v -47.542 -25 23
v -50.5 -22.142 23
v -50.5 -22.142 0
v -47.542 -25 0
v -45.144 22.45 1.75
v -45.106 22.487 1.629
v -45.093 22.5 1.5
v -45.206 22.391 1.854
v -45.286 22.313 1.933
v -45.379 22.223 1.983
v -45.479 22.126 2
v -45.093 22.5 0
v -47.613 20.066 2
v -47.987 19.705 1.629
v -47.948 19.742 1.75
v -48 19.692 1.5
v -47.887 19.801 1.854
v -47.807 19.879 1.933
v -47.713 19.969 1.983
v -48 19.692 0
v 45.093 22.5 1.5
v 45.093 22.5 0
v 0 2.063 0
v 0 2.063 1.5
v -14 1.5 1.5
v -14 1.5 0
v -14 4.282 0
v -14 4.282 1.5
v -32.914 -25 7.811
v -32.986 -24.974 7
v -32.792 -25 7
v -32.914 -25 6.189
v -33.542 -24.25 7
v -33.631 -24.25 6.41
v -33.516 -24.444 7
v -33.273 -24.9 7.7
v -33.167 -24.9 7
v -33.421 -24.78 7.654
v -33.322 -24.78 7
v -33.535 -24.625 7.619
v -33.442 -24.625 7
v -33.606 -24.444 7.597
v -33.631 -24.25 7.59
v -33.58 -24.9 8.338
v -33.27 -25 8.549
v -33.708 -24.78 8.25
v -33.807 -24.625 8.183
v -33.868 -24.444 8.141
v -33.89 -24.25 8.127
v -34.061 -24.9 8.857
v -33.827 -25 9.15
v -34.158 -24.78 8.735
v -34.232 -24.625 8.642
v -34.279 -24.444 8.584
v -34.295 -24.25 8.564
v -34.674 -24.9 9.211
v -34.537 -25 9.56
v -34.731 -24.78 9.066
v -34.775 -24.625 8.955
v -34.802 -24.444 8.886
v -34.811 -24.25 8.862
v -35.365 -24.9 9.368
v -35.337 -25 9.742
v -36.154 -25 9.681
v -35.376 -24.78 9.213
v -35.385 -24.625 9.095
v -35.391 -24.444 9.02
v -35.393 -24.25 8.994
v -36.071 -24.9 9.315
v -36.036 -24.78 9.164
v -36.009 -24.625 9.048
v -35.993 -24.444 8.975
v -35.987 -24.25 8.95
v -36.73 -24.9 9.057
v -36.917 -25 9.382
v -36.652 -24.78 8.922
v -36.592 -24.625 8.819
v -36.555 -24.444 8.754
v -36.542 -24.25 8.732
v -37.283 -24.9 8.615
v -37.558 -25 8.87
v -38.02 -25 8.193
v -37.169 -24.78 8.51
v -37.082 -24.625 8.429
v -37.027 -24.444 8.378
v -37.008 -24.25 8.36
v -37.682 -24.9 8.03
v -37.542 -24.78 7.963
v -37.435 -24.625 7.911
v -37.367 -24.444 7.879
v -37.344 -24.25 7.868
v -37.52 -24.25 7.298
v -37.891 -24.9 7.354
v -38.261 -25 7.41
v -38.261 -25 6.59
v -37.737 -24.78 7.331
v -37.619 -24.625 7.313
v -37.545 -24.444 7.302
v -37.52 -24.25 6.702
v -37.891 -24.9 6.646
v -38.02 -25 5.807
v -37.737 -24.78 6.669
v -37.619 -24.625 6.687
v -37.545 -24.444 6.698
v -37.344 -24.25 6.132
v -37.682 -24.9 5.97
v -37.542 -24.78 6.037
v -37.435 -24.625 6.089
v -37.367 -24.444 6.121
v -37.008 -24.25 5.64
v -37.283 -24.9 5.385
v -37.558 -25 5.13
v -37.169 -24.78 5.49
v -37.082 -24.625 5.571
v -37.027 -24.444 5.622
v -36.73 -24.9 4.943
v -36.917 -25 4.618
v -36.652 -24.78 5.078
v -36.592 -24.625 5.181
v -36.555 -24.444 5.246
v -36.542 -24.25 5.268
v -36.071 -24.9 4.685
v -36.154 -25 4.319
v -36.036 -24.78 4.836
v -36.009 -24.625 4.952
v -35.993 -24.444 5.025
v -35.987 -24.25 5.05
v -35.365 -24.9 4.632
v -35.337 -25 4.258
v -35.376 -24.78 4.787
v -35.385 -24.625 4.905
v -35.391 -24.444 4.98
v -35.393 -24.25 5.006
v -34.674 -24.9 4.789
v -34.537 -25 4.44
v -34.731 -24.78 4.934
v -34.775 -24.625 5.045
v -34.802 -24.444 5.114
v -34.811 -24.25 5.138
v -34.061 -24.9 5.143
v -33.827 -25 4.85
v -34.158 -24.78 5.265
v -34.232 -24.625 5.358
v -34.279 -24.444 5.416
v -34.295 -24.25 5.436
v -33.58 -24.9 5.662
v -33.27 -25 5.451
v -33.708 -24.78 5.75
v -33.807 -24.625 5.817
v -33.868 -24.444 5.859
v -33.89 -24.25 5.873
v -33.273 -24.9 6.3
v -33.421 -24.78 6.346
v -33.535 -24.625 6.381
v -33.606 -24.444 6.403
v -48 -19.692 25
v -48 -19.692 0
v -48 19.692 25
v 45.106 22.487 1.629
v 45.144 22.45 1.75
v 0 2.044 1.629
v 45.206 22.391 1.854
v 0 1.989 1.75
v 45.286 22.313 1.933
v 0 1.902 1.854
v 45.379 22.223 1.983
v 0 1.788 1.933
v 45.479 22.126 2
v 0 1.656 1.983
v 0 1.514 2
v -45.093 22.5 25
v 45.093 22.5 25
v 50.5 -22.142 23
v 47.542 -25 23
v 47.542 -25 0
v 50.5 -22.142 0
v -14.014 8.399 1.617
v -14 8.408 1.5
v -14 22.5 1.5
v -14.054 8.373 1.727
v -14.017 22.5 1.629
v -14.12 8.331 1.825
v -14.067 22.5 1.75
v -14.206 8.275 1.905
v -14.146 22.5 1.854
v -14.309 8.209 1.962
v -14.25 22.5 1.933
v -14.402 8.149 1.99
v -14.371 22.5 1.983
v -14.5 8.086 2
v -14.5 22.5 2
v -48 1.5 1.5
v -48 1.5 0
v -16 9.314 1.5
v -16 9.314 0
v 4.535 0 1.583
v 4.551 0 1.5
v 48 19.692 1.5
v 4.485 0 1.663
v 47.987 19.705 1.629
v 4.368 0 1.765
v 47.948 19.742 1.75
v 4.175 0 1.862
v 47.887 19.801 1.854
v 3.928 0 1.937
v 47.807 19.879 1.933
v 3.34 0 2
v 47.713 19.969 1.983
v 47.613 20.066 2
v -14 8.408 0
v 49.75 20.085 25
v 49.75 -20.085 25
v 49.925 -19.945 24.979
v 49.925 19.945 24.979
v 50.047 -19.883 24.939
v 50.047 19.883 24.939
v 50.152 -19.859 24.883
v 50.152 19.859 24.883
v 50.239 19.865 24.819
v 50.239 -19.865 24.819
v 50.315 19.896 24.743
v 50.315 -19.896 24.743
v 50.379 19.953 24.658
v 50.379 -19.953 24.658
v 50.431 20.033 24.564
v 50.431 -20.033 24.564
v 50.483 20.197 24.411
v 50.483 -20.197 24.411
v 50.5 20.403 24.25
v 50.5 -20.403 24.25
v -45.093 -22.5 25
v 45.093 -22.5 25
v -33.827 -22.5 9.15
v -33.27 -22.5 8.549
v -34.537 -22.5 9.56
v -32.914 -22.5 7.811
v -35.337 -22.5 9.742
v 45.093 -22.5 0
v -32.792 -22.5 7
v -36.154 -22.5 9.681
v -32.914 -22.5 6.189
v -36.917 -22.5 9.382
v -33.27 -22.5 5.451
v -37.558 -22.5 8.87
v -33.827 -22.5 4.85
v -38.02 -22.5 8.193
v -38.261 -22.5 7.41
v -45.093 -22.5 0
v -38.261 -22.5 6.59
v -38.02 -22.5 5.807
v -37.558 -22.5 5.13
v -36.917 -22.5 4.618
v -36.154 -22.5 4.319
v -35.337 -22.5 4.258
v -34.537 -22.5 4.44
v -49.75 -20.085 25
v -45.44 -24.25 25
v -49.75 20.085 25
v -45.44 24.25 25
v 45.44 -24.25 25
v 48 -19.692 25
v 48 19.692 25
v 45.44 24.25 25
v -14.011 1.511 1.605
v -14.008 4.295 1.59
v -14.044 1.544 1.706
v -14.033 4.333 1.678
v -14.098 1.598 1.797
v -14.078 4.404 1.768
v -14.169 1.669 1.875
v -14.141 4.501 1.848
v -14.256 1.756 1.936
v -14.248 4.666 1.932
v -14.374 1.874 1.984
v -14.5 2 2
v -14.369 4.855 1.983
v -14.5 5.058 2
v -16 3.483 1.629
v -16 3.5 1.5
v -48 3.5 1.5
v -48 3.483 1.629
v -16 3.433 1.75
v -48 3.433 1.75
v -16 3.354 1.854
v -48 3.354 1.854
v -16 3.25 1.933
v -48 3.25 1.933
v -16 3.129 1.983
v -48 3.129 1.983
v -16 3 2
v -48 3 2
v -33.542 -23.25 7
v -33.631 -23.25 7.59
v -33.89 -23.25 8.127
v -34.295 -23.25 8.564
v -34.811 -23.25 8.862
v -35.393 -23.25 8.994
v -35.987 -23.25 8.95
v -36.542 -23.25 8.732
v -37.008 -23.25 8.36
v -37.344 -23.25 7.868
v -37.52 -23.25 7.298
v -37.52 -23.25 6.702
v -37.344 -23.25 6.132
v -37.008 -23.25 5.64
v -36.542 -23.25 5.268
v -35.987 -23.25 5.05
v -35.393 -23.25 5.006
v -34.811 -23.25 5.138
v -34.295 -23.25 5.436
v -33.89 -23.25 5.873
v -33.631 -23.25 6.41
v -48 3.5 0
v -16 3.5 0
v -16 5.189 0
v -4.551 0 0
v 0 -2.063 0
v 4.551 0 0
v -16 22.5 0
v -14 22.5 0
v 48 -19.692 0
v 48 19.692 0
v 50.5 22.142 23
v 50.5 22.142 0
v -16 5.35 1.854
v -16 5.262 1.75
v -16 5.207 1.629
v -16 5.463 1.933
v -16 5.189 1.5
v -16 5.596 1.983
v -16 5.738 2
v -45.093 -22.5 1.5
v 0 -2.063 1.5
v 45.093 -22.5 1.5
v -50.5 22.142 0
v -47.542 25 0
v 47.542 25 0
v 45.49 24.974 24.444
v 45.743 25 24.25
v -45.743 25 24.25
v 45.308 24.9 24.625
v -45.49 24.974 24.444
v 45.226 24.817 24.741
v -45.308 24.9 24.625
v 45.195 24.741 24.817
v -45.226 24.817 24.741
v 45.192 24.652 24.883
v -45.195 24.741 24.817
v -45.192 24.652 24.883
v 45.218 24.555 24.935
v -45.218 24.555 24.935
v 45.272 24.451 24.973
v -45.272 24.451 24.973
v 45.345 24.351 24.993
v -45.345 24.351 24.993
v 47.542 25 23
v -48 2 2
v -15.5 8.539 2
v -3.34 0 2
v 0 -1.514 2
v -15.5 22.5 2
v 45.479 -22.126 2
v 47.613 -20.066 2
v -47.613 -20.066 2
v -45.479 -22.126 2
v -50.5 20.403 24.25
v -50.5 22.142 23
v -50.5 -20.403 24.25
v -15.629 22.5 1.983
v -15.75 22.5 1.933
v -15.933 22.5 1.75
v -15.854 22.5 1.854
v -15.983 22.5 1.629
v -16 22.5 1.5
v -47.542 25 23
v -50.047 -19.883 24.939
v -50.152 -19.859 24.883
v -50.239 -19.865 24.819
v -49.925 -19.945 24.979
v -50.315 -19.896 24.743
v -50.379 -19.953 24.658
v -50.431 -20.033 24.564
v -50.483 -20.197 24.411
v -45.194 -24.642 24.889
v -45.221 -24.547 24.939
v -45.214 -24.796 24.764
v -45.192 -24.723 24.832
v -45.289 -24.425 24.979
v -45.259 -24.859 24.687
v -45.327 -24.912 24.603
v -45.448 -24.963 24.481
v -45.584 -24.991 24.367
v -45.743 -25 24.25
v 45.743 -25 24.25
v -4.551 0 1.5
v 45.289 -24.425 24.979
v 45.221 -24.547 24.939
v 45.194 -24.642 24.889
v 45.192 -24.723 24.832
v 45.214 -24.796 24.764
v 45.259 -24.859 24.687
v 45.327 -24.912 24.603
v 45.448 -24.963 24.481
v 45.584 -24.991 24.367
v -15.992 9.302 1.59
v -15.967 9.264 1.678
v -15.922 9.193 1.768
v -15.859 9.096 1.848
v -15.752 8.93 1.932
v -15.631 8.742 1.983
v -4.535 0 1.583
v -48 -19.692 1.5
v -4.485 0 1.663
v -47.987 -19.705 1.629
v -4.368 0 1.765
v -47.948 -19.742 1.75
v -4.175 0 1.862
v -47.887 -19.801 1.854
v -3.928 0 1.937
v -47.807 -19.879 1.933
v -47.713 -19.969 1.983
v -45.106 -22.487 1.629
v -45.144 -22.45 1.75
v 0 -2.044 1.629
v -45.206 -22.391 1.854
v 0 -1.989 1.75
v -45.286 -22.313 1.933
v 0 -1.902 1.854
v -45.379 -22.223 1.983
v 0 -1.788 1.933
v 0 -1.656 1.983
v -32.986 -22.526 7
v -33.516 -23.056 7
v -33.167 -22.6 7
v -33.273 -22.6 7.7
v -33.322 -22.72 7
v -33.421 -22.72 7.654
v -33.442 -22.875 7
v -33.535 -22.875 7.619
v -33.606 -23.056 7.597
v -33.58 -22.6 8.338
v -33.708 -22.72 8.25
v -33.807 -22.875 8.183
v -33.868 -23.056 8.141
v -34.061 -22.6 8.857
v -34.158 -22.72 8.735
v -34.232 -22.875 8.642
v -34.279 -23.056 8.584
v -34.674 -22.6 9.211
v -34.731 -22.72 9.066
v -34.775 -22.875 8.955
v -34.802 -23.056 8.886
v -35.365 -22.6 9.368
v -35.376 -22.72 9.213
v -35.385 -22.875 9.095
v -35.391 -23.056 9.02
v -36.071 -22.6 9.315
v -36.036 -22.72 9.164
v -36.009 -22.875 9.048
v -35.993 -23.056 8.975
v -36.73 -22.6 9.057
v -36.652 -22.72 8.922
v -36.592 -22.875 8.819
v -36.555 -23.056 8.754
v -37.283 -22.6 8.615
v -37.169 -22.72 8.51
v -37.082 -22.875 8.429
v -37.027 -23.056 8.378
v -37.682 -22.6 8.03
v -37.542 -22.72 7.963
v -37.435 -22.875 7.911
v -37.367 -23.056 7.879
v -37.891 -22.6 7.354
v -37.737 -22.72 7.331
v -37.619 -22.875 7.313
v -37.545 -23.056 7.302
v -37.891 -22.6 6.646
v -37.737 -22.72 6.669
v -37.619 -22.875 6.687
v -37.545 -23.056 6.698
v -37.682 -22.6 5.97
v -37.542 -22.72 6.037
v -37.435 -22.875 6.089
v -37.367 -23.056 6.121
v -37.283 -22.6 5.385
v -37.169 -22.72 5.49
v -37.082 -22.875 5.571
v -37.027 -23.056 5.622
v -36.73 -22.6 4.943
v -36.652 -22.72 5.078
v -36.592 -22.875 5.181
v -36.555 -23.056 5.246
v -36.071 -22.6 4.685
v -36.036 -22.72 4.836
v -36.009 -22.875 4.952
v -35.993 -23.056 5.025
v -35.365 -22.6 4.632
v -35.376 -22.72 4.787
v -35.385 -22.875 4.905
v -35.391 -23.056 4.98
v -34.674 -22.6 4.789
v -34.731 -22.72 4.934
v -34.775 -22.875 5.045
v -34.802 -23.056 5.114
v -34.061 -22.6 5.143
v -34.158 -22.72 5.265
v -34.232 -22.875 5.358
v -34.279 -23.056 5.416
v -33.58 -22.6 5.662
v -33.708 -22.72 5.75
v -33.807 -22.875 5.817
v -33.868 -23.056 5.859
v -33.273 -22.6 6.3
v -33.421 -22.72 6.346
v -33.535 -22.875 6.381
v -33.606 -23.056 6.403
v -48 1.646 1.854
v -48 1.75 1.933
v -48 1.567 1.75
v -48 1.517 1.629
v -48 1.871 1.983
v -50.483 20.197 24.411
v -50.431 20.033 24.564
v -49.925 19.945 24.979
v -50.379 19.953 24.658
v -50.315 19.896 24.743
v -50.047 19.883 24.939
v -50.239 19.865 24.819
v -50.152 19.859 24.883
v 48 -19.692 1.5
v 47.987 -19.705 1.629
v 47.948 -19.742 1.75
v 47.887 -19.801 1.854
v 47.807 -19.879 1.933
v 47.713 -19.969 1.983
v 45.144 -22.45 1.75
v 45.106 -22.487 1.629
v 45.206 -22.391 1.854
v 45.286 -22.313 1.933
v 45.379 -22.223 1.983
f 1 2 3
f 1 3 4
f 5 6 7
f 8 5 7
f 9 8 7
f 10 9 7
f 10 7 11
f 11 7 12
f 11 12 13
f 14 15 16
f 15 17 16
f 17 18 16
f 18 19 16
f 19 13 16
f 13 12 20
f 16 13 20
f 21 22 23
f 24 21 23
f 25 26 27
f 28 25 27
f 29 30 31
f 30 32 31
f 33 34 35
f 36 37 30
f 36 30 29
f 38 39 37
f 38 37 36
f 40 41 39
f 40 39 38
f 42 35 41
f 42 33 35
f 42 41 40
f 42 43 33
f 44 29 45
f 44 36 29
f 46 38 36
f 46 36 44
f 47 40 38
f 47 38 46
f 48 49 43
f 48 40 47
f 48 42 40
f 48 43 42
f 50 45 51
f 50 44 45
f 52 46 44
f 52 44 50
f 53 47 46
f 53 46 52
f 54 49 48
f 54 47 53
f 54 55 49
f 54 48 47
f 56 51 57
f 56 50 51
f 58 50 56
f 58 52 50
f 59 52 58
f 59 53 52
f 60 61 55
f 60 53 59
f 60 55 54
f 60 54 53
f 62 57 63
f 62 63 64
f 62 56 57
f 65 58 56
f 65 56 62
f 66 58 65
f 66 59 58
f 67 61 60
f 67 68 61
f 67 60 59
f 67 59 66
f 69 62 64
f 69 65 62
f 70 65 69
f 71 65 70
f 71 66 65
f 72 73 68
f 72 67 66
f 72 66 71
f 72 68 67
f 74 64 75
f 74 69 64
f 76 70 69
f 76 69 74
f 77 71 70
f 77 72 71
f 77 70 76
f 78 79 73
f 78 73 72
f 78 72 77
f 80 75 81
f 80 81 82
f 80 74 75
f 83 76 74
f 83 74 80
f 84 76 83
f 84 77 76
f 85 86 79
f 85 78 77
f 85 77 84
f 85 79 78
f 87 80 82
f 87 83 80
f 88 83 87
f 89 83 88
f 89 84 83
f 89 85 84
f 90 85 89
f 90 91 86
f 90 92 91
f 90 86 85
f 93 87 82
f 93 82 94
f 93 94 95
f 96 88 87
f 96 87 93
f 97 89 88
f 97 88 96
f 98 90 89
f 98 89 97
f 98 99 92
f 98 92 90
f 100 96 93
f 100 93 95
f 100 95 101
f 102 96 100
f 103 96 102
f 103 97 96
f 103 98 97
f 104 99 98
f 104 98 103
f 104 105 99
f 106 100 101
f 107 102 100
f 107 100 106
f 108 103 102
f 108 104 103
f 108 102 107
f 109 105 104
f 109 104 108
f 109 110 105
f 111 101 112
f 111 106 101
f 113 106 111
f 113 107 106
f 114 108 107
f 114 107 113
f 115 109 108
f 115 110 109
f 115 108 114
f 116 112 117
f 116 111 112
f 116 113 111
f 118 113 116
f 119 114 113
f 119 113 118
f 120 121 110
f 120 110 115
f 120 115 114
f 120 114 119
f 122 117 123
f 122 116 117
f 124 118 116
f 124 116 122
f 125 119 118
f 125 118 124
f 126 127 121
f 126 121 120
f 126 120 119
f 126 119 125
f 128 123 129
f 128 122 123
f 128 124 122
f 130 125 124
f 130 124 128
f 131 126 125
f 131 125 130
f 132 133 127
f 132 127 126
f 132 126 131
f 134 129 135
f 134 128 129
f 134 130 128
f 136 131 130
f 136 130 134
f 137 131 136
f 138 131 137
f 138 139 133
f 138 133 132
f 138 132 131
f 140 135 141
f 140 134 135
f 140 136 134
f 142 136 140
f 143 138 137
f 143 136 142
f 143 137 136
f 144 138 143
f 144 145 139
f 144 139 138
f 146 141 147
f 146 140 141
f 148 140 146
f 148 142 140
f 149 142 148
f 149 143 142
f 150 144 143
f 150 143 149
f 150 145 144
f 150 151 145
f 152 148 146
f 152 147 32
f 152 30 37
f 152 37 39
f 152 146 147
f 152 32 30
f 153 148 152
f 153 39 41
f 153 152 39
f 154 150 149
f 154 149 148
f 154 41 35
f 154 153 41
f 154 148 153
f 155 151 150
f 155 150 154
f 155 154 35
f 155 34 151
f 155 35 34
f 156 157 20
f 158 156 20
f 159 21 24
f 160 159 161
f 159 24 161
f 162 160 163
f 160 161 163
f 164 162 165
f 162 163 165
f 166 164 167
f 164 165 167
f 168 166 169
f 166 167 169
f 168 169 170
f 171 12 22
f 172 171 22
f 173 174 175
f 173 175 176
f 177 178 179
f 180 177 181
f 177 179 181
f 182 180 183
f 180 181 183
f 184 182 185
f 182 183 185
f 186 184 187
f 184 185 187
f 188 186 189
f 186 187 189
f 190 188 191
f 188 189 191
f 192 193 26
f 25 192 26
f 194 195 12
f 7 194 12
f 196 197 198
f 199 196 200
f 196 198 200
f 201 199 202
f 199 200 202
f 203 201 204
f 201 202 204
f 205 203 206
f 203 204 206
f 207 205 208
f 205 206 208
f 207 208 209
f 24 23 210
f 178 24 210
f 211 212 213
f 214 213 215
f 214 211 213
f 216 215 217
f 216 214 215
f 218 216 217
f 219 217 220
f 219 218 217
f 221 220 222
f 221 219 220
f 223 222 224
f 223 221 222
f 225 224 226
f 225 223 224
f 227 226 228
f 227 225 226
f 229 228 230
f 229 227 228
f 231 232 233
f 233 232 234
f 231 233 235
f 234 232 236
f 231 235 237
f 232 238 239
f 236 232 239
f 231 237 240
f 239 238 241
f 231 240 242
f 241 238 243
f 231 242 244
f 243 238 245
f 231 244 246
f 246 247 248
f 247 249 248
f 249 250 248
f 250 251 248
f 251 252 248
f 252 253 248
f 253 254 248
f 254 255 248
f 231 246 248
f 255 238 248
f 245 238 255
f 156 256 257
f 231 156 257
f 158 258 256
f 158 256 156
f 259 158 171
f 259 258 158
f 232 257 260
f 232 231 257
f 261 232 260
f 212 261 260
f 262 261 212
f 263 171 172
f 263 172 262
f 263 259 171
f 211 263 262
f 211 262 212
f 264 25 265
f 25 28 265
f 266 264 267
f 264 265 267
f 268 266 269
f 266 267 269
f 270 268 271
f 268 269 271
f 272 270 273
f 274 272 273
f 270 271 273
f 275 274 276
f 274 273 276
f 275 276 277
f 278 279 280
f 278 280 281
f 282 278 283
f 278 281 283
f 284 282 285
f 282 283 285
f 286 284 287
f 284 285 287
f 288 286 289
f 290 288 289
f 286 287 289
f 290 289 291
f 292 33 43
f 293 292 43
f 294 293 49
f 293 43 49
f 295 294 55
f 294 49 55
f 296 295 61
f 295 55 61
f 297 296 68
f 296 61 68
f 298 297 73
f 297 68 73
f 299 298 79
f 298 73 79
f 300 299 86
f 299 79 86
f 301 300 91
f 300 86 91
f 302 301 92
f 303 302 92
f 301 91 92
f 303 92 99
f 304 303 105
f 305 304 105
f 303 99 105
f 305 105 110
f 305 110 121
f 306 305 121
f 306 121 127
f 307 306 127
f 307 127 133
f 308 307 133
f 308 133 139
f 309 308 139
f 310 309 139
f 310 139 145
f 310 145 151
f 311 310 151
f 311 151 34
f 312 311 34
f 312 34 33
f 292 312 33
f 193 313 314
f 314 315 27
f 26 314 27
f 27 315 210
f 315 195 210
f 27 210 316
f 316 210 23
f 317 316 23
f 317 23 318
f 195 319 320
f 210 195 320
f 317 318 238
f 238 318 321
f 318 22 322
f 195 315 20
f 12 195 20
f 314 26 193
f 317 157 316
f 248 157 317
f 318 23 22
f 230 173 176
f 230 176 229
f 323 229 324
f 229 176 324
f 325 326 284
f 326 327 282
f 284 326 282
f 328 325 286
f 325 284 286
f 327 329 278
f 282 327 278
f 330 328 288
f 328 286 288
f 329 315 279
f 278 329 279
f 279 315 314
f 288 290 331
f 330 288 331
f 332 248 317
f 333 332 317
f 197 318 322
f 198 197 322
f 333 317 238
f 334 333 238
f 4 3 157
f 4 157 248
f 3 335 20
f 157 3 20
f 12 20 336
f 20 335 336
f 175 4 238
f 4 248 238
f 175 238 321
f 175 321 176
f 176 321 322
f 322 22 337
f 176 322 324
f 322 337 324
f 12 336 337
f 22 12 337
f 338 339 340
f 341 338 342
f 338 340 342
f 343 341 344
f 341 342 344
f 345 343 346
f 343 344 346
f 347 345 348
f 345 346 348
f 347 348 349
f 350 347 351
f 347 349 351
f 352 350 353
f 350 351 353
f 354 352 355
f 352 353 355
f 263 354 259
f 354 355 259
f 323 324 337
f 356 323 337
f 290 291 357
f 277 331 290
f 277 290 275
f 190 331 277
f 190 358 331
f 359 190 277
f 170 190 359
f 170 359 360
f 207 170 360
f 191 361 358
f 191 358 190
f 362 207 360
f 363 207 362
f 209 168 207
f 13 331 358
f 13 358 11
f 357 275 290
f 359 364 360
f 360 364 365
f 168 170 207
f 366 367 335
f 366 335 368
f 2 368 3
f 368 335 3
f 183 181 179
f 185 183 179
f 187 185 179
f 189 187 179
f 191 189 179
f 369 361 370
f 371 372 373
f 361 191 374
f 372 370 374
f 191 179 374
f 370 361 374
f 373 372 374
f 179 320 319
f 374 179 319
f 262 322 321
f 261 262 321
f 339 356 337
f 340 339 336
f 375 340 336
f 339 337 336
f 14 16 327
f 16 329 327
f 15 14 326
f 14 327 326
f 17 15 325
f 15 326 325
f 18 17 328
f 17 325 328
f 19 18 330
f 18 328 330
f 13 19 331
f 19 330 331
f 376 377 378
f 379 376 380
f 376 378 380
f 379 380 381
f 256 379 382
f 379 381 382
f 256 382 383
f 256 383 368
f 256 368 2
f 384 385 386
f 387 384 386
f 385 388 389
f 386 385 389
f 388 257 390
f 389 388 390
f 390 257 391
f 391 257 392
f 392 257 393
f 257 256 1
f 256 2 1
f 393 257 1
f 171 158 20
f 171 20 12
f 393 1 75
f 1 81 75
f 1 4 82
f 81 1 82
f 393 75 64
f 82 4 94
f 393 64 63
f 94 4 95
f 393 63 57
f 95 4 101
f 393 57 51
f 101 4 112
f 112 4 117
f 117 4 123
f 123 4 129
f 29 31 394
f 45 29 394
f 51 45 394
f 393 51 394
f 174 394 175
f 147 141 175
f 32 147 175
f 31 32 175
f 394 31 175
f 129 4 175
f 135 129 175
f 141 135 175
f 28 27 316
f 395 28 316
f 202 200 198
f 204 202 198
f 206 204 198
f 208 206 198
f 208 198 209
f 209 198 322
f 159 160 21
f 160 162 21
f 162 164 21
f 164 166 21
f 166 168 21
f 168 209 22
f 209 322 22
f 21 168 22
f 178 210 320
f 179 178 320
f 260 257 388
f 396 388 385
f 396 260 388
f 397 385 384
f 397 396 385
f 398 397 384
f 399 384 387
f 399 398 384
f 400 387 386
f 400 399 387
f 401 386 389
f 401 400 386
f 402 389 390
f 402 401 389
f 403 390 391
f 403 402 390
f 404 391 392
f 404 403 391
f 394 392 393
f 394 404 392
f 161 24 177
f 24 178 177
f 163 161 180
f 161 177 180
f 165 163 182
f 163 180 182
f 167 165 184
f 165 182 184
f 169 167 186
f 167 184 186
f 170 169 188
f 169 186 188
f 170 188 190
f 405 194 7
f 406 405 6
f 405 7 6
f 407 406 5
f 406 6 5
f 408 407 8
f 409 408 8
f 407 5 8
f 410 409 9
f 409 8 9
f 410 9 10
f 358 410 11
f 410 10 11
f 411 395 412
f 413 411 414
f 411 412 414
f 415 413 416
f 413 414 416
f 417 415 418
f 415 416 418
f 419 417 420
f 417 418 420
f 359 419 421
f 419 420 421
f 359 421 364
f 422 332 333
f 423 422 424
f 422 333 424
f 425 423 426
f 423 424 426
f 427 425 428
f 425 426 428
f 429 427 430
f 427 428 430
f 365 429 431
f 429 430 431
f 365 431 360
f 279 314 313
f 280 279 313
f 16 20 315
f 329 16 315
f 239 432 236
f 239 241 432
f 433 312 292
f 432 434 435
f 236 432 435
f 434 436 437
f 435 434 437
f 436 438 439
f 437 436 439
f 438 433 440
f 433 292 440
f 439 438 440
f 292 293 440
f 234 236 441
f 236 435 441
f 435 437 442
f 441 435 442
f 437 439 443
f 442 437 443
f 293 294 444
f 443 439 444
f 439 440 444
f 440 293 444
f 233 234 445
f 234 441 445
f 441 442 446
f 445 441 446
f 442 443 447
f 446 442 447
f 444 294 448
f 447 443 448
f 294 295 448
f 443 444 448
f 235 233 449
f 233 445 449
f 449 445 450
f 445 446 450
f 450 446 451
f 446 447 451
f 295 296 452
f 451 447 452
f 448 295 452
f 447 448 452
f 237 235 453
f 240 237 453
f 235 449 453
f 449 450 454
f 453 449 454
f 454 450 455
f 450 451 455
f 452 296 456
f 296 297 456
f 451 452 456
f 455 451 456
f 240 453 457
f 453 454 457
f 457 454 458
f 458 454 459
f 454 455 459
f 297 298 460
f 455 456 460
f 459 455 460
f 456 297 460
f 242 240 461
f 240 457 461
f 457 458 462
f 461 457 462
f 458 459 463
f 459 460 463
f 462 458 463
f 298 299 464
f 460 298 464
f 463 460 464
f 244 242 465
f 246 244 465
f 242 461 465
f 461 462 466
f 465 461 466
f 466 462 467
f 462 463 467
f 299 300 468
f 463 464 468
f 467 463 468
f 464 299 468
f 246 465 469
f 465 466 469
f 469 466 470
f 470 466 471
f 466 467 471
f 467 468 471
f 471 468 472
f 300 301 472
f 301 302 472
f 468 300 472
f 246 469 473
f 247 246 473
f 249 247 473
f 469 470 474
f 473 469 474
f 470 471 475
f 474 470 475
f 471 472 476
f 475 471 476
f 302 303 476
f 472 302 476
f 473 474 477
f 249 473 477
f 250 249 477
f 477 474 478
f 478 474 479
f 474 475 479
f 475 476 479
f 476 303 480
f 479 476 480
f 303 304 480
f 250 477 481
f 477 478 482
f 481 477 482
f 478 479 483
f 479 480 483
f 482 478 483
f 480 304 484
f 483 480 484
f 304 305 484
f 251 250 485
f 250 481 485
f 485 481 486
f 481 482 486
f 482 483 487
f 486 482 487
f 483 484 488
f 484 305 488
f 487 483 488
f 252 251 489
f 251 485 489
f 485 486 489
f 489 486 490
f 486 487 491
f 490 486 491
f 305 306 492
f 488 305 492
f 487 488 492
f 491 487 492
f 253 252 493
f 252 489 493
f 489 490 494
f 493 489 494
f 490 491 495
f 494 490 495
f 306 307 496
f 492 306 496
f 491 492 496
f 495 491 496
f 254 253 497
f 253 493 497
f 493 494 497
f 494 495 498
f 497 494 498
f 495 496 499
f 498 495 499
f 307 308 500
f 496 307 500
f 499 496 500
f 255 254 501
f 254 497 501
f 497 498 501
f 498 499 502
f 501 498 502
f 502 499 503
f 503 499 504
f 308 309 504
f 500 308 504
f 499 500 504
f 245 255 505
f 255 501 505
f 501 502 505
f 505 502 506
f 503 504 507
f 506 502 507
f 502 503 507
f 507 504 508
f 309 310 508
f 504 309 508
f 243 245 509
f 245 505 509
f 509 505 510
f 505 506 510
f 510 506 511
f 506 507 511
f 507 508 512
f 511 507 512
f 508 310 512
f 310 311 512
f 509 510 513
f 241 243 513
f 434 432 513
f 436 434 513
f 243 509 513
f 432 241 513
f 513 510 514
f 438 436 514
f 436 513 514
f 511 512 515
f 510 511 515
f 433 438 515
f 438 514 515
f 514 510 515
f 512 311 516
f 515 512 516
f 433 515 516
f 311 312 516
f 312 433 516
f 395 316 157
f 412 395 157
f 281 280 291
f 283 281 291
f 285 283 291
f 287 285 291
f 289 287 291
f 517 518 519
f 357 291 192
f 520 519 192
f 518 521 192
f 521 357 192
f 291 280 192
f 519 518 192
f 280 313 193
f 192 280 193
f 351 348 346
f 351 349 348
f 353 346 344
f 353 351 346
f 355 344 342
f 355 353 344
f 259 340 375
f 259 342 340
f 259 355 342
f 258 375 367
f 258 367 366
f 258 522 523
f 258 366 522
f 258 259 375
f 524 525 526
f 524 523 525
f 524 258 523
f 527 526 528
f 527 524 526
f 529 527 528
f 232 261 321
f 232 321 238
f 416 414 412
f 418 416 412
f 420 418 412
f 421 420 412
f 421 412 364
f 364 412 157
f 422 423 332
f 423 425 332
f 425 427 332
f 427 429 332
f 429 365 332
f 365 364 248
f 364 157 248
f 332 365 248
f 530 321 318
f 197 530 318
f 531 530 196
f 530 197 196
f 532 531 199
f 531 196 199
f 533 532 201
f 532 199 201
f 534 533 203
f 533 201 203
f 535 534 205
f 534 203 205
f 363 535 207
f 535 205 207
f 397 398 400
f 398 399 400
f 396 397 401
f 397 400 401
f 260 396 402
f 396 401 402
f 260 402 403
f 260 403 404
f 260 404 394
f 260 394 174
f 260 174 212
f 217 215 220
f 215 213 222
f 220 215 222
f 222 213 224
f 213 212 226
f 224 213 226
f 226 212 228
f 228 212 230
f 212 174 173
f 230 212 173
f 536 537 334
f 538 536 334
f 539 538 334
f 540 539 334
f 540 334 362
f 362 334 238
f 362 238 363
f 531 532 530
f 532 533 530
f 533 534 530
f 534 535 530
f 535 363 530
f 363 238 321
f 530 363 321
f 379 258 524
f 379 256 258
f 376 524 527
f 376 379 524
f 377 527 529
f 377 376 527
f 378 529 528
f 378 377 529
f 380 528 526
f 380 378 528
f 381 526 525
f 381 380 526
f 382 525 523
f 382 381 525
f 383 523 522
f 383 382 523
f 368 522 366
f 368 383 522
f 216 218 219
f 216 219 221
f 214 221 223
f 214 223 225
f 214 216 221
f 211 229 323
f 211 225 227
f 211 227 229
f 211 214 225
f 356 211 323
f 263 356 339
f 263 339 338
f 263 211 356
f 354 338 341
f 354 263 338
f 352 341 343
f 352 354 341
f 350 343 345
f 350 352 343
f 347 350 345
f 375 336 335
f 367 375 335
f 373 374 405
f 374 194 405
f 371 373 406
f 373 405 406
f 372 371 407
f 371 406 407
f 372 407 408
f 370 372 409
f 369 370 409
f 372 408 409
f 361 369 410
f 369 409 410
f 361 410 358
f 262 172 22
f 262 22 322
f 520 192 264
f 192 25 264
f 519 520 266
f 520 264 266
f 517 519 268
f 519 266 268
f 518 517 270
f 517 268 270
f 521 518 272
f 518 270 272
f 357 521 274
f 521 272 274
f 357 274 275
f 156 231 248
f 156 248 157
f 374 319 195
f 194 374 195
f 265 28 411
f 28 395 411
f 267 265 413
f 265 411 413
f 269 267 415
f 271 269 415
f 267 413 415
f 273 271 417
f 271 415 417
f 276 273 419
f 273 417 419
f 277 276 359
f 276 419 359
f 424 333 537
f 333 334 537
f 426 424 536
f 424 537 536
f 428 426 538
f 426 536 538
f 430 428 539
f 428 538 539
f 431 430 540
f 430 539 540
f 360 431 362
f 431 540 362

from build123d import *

# Parameters (mm, degrees)
F1_DEPTH = 25
F2_R     = 2
F3_DEPTH = 25
F4_SIZE  = 2
F5_DEPTH = 2
F6_R     = 0.5
F7_R     = 0.75


with BuildPart() as f1:
    # F0 (on Top) → F1 (new body)
    with BuildSketch(Plane.XY):
        Polygon((47.5420507878, 25), (-47.5420507878, 25), (-50.5, 22.1415455767), (-50.5, -22.1415455767), (-47.5420507878, -25), (47.5420507878, -25), (50.5, -22.1415455767), (50.5, 22.1415455767), align=None)
        Polygon((-48, 19.6920558339), (-45.092561045, 22.5), (-16, 22.5), (-14, 22.5), (45.092561045, 22.5), (48, 19.6920558339), (48, -19.6920558339), (45.092561045, -22.5), (-45.092561045, -22.5), (-48, -19.6920558339), (-48, 1.5), (-48, 3.5), align=None, mode=Mode.SUBTRACT)
    extrude(amount=F1_DEPTH)

    # F2 (on face) → F3 (cut)
    with BuildSketch(Plane.XZ.offset(25)):
        with Locations((-35.5420507878, 7)):
            Circle(F2_R)
    extrude(amount=-F3_DEPTH, mode=Mode.SUBTRACT)

    # F4
    f4_edges = [f1.edges().sort_by_distance(p)[0] for p in [
        (-49.021025, -23.570773, 25),
        (49.021025, -23.570773, 25),
        (49.021025, 23.570773, 25),
        (-49.021025, 23.570773, 25),
    ]]
    chamfer(f4_edges, length=F4_SIZE)

    # F7
    f7_edges = [f1.edges().sort_by_distance(p)[0] for p in [
        (0, -25, 25),
        (-50.5, 0, 25),
        (0, 25, 25),
        (50.5, 0, 25),
        (-37.542051, -25, 7),
        (-33.542051, -23.75, 7),
        (-37.542051, -22.5, 7),
    ]]
    fillet(f7_edges, radius=F7_R)


with BuildPart() as f5:
    # F0 (on Top) → F5 (new body)
    with BuildSketch(Plane.XY):
        Polygon((-16, 9.3144678137), (-45.092561045, 22.5), (-48, 19.6920558339), (-16, 5.1887940101), align=None)
        Polygon((-14, 22.5), (-16, 22.5), (-16, 9.3144678137), (-16, 5.1887940101), (-16, 3.5), (-48, 3.5), (-48, 1.5), (-14, 1.5), (-14, 4.2823401461), (-14, 8.4080139497), align=None)
        Polygon((48, 19.6920558339), (45.092561045, 22.5), (0, 2.0628369018), (-14, 8.4080139497), (-14, 4.2823401461), (-4.5514437827, 0), (-48, -19.6920558339), (-45.092561045, -22.5), (0, -2.0628369018), (45.092561045, -22.5), (48, -19.6920558339), (4.5514437827, 0), align=None)
    extrude(amount=F5_DEPTH)

    # F6
    f6_edges = [f5.edges().sort_by_distance(p)[0] for p in [
        (-30.546281, 15.907234, 2),
        (-32, 12.440425, 2),
        (-32, 3.5, 2),
        (-31, 1.5, 2),
        (-14, 2.89117, 2),
        (-9.275722, 2.14117, 2),
        (22.546281, 12.281418, 2),
        (26.275722, 9.846028, 2),
        (22.546281, -12.281418, 2),
        (26.275722, -9.846028, 2),
        (-22.546281, -12.281418, 2),
        (-26.275722, -9.846028, 2),
        (-14, 15.454007, 2),
        (-16, 15.907234, 2),
        (-7, 5.235425, 2),
    ]]
    fillet(f6_edges, radius=F6_R)


solid = Compound([f1.part, f5.part])
